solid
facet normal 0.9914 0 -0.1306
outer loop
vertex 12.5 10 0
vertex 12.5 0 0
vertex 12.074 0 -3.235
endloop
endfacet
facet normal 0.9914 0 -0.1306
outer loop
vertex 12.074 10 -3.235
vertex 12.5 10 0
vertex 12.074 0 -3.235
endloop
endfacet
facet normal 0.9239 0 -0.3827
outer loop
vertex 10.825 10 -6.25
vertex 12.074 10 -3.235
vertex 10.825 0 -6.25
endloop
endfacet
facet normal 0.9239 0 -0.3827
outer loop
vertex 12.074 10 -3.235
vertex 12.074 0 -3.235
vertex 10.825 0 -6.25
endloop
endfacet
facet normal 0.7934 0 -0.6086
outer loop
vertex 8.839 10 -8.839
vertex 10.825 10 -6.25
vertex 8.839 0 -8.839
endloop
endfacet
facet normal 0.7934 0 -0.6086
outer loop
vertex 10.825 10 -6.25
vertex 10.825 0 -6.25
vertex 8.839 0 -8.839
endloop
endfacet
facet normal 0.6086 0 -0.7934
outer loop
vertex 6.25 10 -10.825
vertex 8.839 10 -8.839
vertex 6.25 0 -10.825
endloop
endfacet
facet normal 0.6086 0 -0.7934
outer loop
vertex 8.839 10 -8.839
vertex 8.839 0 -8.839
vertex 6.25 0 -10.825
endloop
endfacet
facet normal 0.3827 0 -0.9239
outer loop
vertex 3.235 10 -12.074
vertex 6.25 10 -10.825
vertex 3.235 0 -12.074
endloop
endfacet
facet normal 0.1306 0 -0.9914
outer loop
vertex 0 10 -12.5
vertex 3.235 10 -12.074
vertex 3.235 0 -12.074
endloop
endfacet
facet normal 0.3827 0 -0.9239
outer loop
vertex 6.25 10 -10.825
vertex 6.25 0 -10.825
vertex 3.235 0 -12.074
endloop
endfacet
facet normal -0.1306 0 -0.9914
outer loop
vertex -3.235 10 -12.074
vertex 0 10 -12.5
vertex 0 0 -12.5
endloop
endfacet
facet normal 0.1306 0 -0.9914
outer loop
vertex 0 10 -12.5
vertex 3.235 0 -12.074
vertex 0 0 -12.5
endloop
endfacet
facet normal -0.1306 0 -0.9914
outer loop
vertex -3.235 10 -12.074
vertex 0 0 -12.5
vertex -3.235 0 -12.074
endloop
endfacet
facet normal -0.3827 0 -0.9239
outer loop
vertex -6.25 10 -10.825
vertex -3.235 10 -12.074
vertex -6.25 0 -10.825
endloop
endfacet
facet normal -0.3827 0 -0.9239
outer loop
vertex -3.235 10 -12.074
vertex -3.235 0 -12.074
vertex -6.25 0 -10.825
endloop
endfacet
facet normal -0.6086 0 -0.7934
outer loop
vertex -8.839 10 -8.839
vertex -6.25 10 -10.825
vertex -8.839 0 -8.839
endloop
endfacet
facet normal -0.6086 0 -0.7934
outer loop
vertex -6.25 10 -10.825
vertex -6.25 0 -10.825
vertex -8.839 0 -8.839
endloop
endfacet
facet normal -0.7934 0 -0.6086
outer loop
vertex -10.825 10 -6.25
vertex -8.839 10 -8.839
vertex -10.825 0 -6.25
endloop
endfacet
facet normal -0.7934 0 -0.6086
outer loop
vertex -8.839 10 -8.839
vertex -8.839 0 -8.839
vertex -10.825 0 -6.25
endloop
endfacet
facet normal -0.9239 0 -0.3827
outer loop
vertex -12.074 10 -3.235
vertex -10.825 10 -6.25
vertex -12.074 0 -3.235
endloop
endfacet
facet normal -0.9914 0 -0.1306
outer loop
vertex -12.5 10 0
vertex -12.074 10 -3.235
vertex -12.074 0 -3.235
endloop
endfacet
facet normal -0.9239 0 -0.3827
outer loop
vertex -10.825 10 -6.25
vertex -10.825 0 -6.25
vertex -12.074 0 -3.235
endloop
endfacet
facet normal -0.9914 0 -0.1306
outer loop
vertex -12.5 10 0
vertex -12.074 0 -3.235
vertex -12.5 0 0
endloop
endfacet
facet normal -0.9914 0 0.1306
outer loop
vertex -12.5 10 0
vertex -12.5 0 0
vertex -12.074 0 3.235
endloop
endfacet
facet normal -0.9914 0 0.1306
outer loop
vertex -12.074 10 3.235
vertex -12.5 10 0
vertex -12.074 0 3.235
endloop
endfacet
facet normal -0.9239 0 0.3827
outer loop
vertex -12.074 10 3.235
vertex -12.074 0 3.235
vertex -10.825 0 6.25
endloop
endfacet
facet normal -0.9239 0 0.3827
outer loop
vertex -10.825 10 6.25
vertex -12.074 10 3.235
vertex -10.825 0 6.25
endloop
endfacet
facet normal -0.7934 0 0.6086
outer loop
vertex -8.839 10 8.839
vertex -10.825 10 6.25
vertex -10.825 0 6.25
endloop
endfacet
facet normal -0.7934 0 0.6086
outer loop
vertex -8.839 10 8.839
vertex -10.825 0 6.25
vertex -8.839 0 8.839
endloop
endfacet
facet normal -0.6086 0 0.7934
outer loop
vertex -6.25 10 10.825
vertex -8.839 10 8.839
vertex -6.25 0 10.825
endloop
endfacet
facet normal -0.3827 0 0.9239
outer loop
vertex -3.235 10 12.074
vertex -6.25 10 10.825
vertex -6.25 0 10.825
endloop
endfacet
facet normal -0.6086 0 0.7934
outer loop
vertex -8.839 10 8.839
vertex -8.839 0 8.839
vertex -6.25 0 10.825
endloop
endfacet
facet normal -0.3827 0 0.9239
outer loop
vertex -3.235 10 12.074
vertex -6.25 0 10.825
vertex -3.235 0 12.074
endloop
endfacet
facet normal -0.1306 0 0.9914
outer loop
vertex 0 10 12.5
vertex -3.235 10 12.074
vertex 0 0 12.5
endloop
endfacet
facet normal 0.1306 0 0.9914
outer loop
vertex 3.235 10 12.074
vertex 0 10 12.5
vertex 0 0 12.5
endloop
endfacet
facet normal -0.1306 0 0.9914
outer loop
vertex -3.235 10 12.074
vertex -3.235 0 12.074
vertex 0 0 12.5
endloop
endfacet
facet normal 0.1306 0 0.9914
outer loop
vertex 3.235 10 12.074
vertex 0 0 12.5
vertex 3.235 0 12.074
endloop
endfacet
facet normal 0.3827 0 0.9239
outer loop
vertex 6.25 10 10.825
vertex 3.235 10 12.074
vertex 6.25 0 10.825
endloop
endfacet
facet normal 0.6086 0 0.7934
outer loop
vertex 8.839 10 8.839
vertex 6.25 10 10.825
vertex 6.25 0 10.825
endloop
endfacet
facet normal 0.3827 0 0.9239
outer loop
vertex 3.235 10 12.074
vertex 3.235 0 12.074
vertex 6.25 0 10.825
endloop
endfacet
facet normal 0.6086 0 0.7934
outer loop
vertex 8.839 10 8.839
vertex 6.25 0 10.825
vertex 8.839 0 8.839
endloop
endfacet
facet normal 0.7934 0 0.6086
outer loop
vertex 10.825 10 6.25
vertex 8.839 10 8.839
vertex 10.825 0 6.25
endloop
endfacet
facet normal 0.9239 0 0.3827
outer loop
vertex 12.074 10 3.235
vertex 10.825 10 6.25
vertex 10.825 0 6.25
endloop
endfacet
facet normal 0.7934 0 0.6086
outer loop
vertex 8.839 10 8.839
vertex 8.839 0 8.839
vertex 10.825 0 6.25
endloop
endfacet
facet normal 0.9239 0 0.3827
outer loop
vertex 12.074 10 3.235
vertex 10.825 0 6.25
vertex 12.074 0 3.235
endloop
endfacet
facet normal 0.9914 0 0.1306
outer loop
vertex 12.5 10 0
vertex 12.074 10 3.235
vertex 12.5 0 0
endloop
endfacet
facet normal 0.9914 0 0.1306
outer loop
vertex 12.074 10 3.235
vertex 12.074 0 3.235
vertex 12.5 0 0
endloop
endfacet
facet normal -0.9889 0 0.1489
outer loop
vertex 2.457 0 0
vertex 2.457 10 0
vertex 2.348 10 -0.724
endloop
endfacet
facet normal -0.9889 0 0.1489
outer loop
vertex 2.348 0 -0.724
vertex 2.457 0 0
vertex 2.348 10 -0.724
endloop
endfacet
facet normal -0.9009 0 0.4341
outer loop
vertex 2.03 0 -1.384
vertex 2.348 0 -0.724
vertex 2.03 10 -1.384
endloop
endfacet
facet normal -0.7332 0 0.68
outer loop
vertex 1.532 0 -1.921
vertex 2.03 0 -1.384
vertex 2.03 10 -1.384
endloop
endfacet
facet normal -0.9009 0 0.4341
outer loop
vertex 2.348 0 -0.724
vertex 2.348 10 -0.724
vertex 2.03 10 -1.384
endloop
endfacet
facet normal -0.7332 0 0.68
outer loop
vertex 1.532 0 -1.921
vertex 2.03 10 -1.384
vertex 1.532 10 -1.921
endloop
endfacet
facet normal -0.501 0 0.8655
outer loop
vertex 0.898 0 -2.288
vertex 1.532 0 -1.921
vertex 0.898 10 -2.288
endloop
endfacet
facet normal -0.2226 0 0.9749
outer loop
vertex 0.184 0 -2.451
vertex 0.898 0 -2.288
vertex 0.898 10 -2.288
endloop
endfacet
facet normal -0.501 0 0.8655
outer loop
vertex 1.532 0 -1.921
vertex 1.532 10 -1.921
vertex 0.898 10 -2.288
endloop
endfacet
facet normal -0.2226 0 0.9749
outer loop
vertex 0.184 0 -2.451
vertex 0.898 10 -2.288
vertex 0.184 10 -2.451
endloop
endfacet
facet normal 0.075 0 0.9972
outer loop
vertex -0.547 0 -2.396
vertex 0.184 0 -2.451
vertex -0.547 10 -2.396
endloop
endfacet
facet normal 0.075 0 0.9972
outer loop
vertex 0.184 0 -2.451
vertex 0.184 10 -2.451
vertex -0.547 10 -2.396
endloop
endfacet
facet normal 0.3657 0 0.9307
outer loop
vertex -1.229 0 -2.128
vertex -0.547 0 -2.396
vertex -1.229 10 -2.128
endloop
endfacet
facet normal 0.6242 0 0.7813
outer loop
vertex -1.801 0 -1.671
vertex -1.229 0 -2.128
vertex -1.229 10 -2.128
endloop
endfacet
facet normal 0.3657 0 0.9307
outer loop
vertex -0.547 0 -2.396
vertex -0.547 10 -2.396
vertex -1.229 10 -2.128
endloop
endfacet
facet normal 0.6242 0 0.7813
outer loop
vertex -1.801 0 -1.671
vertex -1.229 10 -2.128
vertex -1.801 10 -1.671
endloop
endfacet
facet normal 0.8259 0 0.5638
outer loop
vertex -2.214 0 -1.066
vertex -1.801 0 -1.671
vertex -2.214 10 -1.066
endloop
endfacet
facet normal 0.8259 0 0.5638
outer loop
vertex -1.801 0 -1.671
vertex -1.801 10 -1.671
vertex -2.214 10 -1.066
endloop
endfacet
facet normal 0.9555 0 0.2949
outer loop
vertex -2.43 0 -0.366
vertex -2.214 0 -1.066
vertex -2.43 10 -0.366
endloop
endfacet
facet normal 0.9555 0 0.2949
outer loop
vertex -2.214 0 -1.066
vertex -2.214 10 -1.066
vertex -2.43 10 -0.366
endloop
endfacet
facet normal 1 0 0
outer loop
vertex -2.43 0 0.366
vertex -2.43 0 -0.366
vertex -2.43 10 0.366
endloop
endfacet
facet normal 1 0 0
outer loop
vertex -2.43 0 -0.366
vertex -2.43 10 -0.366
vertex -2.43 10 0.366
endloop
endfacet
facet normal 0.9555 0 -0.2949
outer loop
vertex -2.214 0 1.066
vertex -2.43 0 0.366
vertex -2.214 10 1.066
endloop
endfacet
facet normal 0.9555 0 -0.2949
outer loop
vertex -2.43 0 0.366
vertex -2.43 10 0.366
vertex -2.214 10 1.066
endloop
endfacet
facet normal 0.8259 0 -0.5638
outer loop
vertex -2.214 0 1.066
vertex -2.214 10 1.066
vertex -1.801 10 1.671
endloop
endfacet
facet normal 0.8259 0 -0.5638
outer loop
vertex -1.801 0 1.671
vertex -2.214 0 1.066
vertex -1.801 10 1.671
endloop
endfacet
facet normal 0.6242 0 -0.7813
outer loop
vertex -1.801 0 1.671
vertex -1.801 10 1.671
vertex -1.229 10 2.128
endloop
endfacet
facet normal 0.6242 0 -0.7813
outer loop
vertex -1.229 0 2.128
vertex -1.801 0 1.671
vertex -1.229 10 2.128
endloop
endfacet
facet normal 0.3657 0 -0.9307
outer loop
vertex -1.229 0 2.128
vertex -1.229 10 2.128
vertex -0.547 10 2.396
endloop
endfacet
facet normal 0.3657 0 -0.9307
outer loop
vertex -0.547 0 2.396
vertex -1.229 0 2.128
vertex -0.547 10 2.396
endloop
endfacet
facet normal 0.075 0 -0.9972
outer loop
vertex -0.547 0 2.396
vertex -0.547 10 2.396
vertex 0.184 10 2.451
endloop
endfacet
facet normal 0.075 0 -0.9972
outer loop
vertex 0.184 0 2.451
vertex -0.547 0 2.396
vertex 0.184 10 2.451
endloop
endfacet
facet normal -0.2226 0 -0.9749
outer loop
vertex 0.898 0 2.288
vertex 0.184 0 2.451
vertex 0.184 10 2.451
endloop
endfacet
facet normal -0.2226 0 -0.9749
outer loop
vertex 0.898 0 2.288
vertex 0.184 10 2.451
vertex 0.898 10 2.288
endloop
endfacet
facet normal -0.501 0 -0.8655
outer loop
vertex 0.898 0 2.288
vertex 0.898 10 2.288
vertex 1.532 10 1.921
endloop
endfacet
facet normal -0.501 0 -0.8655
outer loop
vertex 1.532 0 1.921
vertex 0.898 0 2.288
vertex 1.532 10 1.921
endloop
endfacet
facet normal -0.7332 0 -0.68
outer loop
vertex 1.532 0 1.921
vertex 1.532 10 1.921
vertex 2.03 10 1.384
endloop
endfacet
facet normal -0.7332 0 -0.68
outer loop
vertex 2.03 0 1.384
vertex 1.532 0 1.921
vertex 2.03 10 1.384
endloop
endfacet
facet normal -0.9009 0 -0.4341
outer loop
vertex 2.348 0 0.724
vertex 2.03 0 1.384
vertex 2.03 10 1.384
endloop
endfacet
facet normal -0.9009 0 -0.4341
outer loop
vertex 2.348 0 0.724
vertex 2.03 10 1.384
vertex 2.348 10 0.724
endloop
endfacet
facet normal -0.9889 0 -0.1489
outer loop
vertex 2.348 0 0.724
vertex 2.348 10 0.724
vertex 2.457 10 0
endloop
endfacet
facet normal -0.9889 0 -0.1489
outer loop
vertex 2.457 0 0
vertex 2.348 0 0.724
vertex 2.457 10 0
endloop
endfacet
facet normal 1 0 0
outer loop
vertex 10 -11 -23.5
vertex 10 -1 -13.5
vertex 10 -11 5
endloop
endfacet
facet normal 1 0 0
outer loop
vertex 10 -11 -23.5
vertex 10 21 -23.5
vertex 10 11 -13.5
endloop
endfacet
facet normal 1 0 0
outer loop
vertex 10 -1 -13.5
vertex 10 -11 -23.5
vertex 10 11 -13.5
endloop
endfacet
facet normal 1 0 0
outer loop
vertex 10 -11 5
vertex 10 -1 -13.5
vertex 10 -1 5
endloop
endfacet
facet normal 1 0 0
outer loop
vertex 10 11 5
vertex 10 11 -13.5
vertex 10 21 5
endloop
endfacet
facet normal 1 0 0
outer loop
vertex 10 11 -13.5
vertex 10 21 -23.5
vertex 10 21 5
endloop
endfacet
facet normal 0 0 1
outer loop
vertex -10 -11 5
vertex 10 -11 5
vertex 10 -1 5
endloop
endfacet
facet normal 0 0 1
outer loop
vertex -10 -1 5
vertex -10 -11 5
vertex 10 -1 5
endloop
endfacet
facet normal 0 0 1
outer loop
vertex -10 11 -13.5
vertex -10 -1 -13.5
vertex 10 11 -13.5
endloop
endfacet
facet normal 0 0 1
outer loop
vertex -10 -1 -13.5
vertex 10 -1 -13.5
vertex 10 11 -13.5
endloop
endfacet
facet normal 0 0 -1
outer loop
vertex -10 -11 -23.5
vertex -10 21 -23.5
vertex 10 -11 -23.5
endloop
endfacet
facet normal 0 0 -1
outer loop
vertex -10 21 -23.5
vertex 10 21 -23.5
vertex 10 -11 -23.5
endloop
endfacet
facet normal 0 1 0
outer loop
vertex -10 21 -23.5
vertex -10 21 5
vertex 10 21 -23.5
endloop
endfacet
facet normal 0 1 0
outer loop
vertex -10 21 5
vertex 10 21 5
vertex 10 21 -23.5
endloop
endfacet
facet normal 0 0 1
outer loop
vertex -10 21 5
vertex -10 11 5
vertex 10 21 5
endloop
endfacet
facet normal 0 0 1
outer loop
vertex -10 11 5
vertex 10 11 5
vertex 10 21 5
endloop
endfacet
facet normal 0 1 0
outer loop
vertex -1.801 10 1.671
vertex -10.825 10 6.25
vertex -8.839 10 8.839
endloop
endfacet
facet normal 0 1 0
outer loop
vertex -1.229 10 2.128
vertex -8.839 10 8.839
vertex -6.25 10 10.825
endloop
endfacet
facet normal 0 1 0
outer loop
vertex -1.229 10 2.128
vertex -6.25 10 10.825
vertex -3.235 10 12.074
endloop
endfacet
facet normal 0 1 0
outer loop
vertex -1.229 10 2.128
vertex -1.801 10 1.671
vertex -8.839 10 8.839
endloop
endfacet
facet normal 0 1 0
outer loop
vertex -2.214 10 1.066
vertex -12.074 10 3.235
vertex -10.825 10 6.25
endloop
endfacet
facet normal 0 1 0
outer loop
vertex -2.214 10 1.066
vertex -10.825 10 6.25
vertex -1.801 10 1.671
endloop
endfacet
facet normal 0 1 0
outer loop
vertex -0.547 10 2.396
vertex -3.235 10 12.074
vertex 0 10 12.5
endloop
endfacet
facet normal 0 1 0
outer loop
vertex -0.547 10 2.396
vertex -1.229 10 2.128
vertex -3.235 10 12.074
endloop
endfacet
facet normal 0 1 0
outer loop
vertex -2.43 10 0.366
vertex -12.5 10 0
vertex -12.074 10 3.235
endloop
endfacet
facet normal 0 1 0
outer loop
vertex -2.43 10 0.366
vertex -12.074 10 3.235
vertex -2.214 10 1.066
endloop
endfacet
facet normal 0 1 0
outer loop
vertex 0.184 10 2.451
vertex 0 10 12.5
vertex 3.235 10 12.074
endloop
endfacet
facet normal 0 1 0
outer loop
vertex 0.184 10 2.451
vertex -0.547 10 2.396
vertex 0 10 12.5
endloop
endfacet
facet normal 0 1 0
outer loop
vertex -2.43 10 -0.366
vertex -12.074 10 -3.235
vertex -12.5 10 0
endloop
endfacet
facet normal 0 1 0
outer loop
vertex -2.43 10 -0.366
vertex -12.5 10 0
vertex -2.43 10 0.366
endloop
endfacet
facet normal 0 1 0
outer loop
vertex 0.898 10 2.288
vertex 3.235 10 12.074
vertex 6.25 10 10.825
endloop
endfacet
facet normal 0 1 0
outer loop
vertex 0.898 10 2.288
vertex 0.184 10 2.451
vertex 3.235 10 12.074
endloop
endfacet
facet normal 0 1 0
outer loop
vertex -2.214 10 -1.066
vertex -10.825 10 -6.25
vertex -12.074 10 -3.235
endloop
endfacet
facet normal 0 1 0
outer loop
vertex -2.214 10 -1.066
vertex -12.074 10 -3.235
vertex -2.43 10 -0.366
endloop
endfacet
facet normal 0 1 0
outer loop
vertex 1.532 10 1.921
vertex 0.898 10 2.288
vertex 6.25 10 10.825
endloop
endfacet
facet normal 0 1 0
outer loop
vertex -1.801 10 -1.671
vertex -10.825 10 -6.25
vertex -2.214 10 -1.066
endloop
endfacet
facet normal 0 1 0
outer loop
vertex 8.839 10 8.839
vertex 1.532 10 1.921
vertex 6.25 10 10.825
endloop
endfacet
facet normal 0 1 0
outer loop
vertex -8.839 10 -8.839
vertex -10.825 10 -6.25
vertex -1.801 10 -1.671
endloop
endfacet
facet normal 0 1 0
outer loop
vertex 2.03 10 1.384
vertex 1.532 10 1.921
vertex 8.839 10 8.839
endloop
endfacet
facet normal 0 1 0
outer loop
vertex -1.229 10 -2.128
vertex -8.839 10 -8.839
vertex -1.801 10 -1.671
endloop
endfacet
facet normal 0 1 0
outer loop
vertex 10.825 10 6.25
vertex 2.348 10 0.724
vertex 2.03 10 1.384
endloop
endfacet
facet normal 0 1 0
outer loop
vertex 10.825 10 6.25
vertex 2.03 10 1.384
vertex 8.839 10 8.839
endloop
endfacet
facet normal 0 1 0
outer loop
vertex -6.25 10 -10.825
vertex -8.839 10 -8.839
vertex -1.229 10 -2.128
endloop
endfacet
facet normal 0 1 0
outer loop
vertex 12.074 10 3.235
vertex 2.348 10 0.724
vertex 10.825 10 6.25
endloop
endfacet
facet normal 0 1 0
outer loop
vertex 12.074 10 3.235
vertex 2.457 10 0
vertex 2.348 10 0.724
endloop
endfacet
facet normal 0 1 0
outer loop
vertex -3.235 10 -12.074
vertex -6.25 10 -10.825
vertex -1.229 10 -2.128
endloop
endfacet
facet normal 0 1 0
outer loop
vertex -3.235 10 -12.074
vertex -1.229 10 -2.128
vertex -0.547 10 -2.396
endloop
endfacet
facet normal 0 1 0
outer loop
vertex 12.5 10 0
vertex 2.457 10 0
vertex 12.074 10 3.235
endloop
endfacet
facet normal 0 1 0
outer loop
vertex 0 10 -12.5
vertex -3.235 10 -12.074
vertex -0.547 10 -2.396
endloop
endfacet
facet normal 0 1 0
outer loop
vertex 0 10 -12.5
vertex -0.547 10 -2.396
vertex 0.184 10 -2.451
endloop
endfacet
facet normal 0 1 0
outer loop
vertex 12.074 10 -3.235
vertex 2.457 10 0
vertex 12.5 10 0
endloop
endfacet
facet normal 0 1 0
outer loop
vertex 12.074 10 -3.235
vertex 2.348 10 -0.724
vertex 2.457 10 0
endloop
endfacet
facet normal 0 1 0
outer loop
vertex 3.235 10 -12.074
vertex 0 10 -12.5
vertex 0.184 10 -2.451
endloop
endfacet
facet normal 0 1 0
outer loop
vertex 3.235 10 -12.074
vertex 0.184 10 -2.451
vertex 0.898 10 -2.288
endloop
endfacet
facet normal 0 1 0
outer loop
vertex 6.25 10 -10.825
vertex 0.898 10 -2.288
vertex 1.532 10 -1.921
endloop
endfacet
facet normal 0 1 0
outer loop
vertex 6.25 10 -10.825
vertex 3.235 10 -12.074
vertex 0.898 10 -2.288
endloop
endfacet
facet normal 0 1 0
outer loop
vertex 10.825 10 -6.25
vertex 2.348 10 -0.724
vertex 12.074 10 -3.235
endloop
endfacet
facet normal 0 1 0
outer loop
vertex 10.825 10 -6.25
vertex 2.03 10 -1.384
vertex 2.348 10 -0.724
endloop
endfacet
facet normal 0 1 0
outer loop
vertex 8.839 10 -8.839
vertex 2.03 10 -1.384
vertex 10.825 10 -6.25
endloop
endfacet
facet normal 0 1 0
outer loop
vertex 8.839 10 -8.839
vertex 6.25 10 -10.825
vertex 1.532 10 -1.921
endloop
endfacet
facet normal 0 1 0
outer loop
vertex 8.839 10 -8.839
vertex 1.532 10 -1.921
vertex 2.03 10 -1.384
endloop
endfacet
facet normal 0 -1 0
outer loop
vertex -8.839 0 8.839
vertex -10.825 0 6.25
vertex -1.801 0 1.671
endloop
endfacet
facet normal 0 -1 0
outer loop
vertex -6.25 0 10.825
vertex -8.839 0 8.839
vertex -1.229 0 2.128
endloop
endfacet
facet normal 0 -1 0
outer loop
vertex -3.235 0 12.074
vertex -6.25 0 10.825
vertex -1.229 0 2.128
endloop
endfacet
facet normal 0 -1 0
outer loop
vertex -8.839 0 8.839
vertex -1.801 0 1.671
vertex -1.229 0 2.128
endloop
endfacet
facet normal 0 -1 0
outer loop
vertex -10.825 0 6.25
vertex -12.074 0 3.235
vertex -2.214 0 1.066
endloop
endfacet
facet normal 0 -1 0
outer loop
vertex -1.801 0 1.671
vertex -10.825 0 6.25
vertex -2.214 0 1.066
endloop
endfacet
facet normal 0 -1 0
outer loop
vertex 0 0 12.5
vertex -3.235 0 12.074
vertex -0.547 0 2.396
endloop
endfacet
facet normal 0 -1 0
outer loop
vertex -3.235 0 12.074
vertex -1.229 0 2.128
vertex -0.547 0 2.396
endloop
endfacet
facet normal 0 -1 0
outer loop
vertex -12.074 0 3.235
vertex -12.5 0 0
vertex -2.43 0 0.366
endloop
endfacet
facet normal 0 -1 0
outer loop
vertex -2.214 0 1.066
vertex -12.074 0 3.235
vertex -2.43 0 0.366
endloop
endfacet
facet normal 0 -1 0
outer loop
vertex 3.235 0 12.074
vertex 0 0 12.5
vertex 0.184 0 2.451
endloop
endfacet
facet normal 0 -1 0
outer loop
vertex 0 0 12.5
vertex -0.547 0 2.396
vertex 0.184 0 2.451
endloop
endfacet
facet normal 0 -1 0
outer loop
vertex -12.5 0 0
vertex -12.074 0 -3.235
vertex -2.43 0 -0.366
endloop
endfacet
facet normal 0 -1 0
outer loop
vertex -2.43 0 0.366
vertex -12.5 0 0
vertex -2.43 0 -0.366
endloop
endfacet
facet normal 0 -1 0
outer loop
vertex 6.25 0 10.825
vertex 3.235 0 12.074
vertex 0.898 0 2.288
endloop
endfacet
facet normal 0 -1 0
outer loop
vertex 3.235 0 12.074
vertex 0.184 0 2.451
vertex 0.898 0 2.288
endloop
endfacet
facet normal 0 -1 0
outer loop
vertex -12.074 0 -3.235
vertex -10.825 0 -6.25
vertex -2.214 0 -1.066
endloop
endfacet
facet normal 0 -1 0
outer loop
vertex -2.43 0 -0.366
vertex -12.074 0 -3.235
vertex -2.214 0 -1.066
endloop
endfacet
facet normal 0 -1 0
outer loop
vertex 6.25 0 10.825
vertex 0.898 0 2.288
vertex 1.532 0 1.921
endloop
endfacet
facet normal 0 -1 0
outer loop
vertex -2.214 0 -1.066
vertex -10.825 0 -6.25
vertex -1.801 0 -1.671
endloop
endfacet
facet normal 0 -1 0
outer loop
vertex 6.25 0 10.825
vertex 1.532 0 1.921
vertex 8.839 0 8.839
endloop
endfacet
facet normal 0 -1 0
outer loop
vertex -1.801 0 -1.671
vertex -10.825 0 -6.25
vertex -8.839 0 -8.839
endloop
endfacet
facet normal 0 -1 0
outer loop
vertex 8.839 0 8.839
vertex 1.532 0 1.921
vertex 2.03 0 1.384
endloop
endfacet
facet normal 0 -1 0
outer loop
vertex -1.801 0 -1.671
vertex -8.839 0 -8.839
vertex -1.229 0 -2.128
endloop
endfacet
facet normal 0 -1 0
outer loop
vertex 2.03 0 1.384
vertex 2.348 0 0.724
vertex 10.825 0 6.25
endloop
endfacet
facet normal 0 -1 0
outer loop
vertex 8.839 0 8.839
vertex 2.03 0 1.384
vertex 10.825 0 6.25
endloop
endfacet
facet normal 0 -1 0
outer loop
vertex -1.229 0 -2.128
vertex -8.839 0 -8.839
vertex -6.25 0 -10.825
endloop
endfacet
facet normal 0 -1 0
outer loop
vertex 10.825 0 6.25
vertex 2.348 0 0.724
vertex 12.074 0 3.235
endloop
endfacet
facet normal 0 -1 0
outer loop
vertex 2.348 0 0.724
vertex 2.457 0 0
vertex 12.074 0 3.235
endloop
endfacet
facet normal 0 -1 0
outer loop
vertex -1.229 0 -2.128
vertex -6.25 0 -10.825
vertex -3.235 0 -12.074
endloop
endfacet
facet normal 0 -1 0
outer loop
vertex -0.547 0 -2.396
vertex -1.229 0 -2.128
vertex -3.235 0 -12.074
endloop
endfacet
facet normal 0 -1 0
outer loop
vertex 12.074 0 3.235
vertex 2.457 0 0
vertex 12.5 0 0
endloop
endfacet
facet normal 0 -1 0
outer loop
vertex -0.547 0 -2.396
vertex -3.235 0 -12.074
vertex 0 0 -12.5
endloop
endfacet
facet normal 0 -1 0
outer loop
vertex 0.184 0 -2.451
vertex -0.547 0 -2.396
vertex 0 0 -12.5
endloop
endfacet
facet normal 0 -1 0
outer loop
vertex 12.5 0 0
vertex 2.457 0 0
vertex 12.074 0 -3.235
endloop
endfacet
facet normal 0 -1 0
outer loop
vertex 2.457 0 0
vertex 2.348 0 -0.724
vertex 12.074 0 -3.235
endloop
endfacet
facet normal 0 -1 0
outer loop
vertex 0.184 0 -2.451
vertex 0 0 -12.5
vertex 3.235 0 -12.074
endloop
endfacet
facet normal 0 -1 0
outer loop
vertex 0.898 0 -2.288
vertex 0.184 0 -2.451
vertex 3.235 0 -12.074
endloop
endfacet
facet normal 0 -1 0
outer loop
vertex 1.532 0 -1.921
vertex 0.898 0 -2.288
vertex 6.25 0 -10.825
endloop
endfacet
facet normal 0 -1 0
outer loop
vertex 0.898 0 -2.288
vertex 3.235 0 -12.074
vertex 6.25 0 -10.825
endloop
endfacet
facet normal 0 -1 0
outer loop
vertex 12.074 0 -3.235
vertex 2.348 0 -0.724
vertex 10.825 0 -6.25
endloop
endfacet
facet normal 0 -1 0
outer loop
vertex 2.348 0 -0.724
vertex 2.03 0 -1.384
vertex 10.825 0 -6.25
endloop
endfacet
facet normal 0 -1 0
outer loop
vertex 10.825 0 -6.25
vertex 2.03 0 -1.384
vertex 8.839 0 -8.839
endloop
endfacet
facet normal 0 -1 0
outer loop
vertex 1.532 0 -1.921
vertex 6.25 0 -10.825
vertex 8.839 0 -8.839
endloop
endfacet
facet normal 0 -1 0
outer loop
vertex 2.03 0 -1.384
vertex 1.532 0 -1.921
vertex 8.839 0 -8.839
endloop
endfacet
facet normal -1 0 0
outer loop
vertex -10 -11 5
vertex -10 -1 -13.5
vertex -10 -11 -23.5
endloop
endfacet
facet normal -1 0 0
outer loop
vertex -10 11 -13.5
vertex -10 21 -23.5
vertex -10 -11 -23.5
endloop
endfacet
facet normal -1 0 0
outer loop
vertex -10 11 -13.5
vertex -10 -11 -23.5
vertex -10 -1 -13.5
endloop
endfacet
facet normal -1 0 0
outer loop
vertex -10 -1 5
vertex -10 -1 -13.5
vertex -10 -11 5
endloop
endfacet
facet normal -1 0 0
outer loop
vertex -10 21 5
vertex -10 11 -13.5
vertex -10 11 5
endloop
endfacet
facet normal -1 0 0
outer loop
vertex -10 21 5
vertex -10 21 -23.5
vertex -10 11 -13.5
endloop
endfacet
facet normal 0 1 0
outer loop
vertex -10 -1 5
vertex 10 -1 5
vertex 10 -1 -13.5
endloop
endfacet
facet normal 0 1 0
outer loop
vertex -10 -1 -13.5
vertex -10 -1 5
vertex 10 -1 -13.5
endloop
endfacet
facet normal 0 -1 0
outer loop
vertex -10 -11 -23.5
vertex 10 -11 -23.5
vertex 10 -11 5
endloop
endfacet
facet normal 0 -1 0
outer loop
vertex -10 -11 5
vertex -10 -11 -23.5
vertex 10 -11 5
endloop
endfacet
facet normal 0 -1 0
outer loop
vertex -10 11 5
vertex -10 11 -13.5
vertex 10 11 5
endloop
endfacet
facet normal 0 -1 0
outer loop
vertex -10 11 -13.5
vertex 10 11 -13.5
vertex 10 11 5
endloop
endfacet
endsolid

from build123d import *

# Parameters (mm, degrees)
SKETCH1_R                = 12.5
BOSS_EXTRUDE1_DEPTH      = 10
F_8_CLEARANCE_HOLE1_D    = 4.9149
BOSS_EXTRUDE2_DEPTH      = 10
BOSS_EXTRUDE2_DEPTH_BACK = 10


with BuildPart() as part:
    # Sketch1 → Boss-Extrude1 (new body)
    with BuildSketch(Plane(origin=(0, 0, 0), x_dir=(1, 0, 0), z_dir=(0, 1, 0))):
        Circle(SKETCH1_R)
    extrude(amount=BOSS_EXTRUDE1_DEPTH)

    # #8 Clearance Hole1 (through all)
    with Locations(Plane(origin=(0, 0, 0), x_dir=(-1, 0, 0), z_dir=(0, -1, 0))):
        with Locations((0, 0)):
            Hole(F_8_CLEARANCE_HOLE1_D / 2)


with BuildPart() as body_2:
    # Sketch4 → Boss-Extrude2 (new, two sides: drawn at the far end of the back side and taken through both)
    with BuildSketch(Plane(origin=(0, 0, 0), x_dir=(0, 0, -1), z_dir=(1, 0, 0)).offset(-BOSS_EXTRUDE2_DEPTH_BACK)):
        Polygon((-5, -1), (13.5, -1), (13.5, 11), (-5, 11), (-5, 21), (23.5, 21), (23.5, -11), (-5, -11), align=None)
    extrude(amount=BOSS_EXTRUDE2_DEPTH + BOSS_EXTRUDE2_DEPTH_BACK)


solid = Compound([part.part, body_2.part])
